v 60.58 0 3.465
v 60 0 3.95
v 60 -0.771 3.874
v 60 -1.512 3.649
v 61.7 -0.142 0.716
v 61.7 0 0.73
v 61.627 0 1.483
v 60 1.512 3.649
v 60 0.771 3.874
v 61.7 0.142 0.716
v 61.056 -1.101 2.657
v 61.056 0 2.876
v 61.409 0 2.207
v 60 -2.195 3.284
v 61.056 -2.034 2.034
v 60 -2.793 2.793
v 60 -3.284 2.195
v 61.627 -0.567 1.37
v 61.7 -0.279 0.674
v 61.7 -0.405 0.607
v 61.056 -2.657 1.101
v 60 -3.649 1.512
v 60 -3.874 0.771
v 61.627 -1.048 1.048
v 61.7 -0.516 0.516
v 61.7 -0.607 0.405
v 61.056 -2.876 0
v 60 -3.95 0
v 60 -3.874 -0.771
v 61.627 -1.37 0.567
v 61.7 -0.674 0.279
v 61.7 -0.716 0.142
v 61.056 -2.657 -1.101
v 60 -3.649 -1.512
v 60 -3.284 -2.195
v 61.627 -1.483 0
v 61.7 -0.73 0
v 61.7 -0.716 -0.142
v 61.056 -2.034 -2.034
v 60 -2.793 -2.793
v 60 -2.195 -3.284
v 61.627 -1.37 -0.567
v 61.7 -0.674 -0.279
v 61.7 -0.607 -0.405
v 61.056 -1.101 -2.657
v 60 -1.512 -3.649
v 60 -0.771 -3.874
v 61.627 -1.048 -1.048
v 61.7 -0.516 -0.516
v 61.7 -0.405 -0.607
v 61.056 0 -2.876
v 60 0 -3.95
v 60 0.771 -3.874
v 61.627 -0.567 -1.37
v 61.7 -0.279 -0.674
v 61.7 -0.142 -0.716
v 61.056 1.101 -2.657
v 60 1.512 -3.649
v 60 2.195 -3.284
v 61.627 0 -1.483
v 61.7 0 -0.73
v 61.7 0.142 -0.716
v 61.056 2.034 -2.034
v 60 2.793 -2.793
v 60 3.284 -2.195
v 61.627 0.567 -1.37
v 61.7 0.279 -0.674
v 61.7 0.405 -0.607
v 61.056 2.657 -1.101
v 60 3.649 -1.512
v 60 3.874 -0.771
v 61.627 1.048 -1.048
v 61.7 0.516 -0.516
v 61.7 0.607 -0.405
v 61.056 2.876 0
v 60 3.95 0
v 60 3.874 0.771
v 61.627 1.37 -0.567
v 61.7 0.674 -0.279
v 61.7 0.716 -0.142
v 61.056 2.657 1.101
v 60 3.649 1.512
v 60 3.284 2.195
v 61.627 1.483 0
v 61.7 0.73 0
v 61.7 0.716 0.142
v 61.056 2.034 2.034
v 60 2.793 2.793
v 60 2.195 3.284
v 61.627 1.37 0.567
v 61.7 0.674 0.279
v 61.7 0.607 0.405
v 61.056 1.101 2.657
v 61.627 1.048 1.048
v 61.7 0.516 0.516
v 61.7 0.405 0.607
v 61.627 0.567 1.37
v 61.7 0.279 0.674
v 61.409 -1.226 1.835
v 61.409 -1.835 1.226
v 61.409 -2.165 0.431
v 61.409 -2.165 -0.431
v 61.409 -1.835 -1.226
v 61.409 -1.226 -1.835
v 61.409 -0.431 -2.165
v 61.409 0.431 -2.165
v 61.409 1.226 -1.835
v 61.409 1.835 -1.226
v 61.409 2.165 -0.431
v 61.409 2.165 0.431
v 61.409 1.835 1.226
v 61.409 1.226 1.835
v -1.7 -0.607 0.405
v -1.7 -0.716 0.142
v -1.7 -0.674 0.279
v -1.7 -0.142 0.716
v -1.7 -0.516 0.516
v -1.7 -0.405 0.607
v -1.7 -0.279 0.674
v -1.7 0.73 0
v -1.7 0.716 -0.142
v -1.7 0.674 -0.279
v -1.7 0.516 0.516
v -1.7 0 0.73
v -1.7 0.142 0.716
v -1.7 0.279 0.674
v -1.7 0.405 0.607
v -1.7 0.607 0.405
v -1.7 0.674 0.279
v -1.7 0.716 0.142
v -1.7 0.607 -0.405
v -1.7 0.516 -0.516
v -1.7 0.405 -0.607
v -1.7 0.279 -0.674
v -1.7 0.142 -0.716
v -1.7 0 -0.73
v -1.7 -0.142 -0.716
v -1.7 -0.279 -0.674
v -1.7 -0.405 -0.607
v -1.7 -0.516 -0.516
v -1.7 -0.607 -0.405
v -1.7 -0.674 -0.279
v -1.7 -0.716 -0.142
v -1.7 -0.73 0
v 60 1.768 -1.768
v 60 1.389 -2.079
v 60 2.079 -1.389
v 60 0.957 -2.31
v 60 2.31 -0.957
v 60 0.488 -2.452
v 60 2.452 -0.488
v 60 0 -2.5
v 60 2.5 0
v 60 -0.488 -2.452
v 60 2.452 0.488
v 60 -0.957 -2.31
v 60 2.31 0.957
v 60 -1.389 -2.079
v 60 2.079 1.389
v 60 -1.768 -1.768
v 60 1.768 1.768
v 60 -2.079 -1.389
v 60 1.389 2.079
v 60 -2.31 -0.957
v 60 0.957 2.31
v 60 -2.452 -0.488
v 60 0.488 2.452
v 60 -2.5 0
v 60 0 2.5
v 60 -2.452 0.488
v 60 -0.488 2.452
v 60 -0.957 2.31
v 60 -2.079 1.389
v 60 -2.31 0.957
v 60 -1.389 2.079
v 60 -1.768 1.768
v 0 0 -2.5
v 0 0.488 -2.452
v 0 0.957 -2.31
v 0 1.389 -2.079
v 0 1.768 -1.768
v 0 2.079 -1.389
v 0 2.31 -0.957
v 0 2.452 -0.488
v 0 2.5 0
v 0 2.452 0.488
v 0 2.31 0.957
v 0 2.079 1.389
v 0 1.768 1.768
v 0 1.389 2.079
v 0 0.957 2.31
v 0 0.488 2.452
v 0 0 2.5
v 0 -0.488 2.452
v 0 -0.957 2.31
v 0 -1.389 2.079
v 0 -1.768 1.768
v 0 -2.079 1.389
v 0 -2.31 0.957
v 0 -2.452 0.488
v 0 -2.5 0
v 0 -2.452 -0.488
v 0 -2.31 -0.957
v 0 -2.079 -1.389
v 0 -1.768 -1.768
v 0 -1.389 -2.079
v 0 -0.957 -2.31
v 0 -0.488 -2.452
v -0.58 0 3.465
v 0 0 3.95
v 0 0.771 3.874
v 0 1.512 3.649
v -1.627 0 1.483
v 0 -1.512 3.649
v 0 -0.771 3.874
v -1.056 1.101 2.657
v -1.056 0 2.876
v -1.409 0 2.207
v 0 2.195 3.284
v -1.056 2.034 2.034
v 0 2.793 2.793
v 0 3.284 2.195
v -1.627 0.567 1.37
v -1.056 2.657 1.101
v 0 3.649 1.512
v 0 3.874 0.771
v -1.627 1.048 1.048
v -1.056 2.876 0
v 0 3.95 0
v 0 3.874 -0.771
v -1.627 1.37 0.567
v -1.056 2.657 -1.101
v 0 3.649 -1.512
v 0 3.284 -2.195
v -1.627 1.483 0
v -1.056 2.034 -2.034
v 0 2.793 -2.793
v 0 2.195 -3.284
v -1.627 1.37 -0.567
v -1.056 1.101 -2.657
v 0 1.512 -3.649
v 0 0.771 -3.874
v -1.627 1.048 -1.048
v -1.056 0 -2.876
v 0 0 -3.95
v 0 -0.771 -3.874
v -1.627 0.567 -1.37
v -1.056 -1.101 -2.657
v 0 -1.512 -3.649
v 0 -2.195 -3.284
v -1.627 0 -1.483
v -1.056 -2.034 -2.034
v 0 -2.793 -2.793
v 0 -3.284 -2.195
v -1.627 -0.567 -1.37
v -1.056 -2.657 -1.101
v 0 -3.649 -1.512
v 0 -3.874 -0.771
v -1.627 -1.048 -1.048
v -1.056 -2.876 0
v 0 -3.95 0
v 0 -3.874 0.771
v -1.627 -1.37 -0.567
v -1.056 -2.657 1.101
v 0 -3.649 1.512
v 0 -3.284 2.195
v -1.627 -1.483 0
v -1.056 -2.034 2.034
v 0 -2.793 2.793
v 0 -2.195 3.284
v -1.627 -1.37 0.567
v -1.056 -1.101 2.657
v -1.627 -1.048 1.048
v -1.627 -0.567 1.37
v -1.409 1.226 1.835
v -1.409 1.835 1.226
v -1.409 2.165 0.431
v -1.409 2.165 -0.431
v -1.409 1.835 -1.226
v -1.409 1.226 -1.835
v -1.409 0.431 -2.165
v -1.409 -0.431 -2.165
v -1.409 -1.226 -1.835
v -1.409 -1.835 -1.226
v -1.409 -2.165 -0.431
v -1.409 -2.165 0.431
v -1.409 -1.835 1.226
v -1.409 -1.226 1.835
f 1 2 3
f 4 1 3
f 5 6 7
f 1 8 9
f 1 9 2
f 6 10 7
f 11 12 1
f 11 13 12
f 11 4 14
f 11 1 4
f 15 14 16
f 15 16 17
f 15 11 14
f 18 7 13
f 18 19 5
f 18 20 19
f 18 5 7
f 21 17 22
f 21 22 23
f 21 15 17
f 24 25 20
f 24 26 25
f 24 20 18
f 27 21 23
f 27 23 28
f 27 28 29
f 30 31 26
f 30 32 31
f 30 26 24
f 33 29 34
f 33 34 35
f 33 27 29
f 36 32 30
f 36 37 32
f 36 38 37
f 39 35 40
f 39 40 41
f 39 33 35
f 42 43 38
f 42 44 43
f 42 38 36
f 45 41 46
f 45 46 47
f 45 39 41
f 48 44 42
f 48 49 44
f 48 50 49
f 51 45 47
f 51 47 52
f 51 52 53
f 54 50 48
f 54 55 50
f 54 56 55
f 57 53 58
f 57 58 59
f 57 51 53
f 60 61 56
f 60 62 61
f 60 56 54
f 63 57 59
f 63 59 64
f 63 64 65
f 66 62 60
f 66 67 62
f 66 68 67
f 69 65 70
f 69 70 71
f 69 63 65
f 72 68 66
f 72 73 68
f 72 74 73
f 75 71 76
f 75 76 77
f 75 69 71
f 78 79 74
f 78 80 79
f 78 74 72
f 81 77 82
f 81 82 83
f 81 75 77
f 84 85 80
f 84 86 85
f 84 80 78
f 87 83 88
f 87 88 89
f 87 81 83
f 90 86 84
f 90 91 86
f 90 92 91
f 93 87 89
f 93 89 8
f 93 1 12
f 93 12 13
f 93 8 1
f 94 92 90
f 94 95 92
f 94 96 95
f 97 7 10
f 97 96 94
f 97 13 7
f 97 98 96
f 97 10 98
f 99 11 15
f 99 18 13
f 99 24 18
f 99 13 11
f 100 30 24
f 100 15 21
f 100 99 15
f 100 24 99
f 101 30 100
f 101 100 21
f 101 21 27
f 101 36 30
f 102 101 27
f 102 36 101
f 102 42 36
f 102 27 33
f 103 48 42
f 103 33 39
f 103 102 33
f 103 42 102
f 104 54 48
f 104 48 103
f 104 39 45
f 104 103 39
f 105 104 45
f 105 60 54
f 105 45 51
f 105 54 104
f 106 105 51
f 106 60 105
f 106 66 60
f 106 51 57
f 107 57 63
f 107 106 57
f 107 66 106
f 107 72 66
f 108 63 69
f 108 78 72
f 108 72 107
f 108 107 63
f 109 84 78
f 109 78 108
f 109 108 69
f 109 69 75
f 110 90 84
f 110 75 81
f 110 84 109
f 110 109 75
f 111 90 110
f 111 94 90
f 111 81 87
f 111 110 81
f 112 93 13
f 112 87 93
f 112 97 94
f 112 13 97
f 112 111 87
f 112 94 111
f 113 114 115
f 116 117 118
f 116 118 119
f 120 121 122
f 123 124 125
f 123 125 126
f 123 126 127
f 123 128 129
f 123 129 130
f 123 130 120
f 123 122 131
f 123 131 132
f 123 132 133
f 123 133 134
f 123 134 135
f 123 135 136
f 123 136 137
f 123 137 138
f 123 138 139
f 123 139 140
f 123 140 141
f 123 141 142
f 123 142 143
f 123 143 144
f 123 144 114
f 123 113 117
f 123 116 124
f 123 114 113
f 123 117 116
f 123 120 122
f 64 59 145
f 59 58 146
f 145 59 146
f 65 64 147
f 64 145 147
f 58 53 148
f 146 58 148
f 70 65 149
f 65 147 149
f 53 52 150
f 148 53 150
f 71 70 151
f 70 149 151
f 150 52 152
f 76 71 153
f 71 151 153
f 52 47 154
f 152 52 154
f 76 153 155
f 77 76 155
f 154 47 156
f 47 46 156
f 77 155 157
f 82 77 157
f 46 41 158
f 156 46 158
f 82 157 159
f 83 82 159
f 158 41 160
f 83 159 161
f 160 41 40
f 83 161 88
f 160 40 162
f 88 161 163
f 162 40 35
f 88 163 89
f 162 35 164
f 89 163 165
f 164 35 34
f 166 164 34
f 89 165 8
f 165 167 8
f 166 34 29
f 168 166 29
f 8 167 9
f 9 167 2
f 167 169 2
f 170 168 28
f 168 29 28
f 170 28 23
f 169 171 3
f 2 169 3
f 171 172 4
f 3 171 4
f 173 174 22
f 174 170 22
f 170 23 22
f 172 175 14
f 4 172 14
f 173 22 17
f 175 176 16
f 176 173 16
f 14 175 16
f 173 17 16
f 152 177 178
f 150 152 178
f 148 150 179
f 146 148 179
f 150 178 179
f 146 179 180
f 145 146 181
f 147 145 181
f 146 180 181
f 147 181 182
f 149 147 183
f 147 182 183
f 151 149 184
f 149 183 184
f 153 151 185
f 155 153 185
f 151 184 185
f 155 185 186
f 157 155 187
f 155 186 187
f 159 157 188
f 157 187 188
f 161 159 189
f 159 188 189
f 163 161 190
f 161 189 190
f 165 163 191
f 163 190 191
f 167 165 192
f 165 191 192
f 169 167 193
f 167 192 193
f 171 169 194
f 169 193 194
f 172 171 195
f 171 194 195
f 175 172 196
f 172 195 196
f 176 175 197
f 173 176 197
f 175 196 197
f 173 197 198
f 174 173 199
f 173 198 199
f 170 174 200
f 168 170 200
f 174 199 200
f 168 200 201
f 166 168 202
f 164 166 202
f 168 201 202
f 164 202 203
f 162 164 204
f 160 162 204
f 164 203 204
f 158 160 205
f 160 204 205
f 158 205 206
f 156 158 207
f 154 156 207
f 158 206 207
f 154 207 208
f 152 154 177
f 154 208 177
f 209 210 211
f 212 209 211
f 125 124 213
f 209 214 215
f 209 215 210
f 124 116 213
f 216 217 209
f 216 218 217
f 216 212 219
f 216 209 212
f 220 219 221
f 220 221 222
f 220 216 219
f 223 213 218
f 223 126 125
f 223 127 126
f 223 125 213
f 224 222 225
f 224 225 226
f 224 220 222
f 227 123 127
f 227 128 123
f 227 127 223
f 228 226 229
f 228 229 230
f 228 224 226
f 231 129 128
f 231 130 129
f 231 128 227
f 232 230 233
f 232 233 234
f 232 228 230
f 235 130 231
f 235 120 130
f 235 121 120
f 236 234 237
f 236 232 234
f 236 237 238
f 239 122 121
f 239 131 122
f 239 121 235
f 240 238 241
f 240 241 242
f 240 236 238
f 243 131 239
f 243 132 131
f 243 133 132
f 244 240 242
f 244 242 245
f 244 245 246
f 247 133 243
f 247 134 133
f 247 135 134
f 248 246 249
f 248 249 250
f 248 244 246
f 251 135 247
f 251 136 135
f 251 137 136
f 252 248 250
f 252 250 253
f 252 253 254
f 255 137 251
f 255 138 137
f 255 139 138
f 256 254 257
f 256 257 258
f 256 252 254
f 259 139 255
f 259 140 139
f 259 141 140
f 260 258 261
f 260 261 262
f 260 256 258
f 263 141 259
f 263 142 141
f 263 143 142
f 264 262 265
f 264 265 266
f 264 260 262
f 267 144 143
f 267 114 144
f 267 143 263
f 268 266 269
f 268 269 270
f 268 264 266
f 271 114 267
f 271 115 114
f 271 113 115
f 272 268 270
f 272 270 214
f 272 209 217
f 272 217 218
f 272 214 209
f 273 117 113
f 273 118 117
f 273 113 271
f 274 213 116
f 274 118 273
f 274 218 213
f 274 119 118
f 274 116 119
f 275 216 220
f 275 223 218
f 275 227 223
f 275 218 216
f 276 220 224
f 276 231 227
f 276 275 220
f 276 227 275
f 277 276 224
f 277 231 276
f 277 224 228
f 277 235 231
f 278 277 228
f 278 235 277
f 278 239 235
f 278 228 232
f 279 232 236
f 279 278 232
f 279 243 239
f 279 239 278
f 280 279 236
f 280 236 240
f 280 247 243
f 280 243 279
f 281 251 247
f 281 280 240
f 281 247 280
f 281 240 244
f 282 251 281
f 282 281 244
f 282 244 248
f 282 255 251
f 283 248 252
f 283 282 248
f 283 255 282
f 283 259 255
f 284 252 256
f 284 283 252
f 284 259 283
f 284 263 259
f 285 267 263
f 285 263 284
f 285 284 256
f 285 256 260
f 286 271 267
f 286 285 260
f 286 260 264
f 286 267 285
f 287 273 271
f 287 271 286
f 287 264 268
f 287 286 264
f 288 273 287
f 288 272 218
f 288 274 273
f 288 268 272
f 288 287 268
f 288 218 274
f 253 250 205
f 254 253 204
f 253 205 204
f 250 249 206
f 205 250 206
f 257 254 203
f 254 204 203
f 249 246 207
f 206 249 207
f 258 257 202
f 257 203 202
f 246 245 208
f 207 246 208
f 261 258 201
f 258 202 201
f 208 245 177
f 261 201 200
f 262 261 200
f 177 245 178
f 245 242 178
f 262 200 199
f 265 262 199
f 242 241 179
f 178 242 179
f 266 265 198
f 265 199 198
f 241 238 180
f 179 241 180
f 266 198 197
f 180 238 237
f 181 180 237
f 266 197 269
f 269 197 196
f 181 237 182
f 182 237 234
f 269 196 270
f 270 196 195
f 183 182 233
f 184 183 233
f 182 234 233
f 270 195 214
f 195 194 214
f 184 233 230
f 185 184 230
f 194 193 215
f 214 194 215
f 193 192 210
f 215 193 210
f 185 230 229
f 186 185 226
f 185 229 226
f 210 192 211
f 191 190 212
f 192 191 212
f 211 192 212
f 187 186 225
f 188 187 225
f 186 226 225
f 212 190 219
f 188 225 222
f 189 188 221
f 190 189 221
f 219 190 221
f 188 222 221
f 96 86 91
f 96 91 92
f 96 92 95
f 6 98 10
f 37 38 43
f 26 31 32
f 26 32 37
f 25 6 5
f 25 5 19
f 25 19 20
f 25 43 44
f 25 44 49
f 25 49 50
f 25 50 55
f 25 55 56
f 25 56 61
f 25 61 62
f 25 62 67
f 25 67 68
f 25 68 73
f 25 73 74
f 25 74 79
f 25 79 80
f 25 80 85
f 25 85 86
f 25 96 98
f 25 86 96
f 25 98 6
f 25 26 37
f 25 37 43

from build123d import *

# Parameters (mm, degrees)
SKETCH_1_R      = 2.5
EXTRUDE_1_DEPTH = 60
SKETCH_2_R      = 3.95
EXTRUDE_2_DEPTH = 1.7
EXTRUDE_START   = 1.7
SKETCH_3_R      = 3.95
EXTRUDE_3_DEPTH = 1.7
FILLET_1_R      = 3.9


with BuildPart() as part:
    # Эскиз1 → Бобышка-Вытянуть1 (new body)
    with BuildSketch(Plane(origin=(0, 0, 0), x_dir=(0, 0, -1), z_dir=(1, 0, 0))):
        Circle(SKETCH_1_R)
    extrude(amount=EXTRUDE_1_DEPTH)

    # Эскиз2 → Бобышка-Вытянуть2 (add)
    with BuildSketch(Plane.ZY):
        Circle(SKETCH_2_R)
    extrude(amount=EXTRUDE_2_DEPTH)

    # Эскиз3 → Бобышка-Вытянуть3 (add)
    with BuildSketch(Plane(origin=(60, 0, 0), x_dir=(0, 0, -1), z_dir=(1, 0, 0)).offset(EXTRUDE_START)):
        with Locations(Location((0, 0, 0), (0, 0, 180))):
            Circle(SKETCH_3_R)
    extrude(amount=-EXTRUDE_3_DEPTH)

    # Скругление1
    # the kernel refuses this fillet: 3.9 mm, written as the material it takes off along each edge
    with BuildSketch(Plane(origin=(61.7, 0, 0), x_dir=(0, 0, 1), z_dir=(0, 1, 0))) as fillet_1_piece_1:
        with BuildLine():
            CenterArc((0.729751562, -3.9), FILLET_1_R, 34.339994944, 55.660005056)
            Line((0.729751562, 0), (0.729751562, 0.078))
            Line((0.729751562, 0.078), (3.95, 0.078))
            Line((3.95, 0.078), (4.028, 0))
            ThreePointArc((4.028, 0), (4.028, -0.85), (4.014404969, -1.656))
            Line((4.014404969, -1.656), (3.95, -1.7))
        make_face()
    revolve(axis=Axis((61.7, 0, 0), (1, 0, 0)), mode=Mode.SUBTRACT)
    with BuildSketch(Plane(origin=(-1.7, 0, 0), x_dir=(0, 0, 1), z_dir=(0, -1, 0))) as fillet_1_piece_2:
        with BuildLine():
            CenterArc((0.729751562, -3.9), FILLET_1_R, 34.339994944, 55.660005056)
            Line((0.729751562, 0), (0.729751562, 0.078))
            Line((0.729751562, 0.078), (3.95, 0.078))
            Line((3.95, 0.078), (4.028, 0))
            ThreePointArc((4.028, 0), (4.028, -0.85), (4.014404969, -1.656))
            Line((4.014404969, -1.656), (3.95, -1.7))
        make_face()
    revolve(axis=Axis((-1.7, 0, 0), (-1, 0, 0)), mode=Mode.SUBTRACT)


solid = part.part
